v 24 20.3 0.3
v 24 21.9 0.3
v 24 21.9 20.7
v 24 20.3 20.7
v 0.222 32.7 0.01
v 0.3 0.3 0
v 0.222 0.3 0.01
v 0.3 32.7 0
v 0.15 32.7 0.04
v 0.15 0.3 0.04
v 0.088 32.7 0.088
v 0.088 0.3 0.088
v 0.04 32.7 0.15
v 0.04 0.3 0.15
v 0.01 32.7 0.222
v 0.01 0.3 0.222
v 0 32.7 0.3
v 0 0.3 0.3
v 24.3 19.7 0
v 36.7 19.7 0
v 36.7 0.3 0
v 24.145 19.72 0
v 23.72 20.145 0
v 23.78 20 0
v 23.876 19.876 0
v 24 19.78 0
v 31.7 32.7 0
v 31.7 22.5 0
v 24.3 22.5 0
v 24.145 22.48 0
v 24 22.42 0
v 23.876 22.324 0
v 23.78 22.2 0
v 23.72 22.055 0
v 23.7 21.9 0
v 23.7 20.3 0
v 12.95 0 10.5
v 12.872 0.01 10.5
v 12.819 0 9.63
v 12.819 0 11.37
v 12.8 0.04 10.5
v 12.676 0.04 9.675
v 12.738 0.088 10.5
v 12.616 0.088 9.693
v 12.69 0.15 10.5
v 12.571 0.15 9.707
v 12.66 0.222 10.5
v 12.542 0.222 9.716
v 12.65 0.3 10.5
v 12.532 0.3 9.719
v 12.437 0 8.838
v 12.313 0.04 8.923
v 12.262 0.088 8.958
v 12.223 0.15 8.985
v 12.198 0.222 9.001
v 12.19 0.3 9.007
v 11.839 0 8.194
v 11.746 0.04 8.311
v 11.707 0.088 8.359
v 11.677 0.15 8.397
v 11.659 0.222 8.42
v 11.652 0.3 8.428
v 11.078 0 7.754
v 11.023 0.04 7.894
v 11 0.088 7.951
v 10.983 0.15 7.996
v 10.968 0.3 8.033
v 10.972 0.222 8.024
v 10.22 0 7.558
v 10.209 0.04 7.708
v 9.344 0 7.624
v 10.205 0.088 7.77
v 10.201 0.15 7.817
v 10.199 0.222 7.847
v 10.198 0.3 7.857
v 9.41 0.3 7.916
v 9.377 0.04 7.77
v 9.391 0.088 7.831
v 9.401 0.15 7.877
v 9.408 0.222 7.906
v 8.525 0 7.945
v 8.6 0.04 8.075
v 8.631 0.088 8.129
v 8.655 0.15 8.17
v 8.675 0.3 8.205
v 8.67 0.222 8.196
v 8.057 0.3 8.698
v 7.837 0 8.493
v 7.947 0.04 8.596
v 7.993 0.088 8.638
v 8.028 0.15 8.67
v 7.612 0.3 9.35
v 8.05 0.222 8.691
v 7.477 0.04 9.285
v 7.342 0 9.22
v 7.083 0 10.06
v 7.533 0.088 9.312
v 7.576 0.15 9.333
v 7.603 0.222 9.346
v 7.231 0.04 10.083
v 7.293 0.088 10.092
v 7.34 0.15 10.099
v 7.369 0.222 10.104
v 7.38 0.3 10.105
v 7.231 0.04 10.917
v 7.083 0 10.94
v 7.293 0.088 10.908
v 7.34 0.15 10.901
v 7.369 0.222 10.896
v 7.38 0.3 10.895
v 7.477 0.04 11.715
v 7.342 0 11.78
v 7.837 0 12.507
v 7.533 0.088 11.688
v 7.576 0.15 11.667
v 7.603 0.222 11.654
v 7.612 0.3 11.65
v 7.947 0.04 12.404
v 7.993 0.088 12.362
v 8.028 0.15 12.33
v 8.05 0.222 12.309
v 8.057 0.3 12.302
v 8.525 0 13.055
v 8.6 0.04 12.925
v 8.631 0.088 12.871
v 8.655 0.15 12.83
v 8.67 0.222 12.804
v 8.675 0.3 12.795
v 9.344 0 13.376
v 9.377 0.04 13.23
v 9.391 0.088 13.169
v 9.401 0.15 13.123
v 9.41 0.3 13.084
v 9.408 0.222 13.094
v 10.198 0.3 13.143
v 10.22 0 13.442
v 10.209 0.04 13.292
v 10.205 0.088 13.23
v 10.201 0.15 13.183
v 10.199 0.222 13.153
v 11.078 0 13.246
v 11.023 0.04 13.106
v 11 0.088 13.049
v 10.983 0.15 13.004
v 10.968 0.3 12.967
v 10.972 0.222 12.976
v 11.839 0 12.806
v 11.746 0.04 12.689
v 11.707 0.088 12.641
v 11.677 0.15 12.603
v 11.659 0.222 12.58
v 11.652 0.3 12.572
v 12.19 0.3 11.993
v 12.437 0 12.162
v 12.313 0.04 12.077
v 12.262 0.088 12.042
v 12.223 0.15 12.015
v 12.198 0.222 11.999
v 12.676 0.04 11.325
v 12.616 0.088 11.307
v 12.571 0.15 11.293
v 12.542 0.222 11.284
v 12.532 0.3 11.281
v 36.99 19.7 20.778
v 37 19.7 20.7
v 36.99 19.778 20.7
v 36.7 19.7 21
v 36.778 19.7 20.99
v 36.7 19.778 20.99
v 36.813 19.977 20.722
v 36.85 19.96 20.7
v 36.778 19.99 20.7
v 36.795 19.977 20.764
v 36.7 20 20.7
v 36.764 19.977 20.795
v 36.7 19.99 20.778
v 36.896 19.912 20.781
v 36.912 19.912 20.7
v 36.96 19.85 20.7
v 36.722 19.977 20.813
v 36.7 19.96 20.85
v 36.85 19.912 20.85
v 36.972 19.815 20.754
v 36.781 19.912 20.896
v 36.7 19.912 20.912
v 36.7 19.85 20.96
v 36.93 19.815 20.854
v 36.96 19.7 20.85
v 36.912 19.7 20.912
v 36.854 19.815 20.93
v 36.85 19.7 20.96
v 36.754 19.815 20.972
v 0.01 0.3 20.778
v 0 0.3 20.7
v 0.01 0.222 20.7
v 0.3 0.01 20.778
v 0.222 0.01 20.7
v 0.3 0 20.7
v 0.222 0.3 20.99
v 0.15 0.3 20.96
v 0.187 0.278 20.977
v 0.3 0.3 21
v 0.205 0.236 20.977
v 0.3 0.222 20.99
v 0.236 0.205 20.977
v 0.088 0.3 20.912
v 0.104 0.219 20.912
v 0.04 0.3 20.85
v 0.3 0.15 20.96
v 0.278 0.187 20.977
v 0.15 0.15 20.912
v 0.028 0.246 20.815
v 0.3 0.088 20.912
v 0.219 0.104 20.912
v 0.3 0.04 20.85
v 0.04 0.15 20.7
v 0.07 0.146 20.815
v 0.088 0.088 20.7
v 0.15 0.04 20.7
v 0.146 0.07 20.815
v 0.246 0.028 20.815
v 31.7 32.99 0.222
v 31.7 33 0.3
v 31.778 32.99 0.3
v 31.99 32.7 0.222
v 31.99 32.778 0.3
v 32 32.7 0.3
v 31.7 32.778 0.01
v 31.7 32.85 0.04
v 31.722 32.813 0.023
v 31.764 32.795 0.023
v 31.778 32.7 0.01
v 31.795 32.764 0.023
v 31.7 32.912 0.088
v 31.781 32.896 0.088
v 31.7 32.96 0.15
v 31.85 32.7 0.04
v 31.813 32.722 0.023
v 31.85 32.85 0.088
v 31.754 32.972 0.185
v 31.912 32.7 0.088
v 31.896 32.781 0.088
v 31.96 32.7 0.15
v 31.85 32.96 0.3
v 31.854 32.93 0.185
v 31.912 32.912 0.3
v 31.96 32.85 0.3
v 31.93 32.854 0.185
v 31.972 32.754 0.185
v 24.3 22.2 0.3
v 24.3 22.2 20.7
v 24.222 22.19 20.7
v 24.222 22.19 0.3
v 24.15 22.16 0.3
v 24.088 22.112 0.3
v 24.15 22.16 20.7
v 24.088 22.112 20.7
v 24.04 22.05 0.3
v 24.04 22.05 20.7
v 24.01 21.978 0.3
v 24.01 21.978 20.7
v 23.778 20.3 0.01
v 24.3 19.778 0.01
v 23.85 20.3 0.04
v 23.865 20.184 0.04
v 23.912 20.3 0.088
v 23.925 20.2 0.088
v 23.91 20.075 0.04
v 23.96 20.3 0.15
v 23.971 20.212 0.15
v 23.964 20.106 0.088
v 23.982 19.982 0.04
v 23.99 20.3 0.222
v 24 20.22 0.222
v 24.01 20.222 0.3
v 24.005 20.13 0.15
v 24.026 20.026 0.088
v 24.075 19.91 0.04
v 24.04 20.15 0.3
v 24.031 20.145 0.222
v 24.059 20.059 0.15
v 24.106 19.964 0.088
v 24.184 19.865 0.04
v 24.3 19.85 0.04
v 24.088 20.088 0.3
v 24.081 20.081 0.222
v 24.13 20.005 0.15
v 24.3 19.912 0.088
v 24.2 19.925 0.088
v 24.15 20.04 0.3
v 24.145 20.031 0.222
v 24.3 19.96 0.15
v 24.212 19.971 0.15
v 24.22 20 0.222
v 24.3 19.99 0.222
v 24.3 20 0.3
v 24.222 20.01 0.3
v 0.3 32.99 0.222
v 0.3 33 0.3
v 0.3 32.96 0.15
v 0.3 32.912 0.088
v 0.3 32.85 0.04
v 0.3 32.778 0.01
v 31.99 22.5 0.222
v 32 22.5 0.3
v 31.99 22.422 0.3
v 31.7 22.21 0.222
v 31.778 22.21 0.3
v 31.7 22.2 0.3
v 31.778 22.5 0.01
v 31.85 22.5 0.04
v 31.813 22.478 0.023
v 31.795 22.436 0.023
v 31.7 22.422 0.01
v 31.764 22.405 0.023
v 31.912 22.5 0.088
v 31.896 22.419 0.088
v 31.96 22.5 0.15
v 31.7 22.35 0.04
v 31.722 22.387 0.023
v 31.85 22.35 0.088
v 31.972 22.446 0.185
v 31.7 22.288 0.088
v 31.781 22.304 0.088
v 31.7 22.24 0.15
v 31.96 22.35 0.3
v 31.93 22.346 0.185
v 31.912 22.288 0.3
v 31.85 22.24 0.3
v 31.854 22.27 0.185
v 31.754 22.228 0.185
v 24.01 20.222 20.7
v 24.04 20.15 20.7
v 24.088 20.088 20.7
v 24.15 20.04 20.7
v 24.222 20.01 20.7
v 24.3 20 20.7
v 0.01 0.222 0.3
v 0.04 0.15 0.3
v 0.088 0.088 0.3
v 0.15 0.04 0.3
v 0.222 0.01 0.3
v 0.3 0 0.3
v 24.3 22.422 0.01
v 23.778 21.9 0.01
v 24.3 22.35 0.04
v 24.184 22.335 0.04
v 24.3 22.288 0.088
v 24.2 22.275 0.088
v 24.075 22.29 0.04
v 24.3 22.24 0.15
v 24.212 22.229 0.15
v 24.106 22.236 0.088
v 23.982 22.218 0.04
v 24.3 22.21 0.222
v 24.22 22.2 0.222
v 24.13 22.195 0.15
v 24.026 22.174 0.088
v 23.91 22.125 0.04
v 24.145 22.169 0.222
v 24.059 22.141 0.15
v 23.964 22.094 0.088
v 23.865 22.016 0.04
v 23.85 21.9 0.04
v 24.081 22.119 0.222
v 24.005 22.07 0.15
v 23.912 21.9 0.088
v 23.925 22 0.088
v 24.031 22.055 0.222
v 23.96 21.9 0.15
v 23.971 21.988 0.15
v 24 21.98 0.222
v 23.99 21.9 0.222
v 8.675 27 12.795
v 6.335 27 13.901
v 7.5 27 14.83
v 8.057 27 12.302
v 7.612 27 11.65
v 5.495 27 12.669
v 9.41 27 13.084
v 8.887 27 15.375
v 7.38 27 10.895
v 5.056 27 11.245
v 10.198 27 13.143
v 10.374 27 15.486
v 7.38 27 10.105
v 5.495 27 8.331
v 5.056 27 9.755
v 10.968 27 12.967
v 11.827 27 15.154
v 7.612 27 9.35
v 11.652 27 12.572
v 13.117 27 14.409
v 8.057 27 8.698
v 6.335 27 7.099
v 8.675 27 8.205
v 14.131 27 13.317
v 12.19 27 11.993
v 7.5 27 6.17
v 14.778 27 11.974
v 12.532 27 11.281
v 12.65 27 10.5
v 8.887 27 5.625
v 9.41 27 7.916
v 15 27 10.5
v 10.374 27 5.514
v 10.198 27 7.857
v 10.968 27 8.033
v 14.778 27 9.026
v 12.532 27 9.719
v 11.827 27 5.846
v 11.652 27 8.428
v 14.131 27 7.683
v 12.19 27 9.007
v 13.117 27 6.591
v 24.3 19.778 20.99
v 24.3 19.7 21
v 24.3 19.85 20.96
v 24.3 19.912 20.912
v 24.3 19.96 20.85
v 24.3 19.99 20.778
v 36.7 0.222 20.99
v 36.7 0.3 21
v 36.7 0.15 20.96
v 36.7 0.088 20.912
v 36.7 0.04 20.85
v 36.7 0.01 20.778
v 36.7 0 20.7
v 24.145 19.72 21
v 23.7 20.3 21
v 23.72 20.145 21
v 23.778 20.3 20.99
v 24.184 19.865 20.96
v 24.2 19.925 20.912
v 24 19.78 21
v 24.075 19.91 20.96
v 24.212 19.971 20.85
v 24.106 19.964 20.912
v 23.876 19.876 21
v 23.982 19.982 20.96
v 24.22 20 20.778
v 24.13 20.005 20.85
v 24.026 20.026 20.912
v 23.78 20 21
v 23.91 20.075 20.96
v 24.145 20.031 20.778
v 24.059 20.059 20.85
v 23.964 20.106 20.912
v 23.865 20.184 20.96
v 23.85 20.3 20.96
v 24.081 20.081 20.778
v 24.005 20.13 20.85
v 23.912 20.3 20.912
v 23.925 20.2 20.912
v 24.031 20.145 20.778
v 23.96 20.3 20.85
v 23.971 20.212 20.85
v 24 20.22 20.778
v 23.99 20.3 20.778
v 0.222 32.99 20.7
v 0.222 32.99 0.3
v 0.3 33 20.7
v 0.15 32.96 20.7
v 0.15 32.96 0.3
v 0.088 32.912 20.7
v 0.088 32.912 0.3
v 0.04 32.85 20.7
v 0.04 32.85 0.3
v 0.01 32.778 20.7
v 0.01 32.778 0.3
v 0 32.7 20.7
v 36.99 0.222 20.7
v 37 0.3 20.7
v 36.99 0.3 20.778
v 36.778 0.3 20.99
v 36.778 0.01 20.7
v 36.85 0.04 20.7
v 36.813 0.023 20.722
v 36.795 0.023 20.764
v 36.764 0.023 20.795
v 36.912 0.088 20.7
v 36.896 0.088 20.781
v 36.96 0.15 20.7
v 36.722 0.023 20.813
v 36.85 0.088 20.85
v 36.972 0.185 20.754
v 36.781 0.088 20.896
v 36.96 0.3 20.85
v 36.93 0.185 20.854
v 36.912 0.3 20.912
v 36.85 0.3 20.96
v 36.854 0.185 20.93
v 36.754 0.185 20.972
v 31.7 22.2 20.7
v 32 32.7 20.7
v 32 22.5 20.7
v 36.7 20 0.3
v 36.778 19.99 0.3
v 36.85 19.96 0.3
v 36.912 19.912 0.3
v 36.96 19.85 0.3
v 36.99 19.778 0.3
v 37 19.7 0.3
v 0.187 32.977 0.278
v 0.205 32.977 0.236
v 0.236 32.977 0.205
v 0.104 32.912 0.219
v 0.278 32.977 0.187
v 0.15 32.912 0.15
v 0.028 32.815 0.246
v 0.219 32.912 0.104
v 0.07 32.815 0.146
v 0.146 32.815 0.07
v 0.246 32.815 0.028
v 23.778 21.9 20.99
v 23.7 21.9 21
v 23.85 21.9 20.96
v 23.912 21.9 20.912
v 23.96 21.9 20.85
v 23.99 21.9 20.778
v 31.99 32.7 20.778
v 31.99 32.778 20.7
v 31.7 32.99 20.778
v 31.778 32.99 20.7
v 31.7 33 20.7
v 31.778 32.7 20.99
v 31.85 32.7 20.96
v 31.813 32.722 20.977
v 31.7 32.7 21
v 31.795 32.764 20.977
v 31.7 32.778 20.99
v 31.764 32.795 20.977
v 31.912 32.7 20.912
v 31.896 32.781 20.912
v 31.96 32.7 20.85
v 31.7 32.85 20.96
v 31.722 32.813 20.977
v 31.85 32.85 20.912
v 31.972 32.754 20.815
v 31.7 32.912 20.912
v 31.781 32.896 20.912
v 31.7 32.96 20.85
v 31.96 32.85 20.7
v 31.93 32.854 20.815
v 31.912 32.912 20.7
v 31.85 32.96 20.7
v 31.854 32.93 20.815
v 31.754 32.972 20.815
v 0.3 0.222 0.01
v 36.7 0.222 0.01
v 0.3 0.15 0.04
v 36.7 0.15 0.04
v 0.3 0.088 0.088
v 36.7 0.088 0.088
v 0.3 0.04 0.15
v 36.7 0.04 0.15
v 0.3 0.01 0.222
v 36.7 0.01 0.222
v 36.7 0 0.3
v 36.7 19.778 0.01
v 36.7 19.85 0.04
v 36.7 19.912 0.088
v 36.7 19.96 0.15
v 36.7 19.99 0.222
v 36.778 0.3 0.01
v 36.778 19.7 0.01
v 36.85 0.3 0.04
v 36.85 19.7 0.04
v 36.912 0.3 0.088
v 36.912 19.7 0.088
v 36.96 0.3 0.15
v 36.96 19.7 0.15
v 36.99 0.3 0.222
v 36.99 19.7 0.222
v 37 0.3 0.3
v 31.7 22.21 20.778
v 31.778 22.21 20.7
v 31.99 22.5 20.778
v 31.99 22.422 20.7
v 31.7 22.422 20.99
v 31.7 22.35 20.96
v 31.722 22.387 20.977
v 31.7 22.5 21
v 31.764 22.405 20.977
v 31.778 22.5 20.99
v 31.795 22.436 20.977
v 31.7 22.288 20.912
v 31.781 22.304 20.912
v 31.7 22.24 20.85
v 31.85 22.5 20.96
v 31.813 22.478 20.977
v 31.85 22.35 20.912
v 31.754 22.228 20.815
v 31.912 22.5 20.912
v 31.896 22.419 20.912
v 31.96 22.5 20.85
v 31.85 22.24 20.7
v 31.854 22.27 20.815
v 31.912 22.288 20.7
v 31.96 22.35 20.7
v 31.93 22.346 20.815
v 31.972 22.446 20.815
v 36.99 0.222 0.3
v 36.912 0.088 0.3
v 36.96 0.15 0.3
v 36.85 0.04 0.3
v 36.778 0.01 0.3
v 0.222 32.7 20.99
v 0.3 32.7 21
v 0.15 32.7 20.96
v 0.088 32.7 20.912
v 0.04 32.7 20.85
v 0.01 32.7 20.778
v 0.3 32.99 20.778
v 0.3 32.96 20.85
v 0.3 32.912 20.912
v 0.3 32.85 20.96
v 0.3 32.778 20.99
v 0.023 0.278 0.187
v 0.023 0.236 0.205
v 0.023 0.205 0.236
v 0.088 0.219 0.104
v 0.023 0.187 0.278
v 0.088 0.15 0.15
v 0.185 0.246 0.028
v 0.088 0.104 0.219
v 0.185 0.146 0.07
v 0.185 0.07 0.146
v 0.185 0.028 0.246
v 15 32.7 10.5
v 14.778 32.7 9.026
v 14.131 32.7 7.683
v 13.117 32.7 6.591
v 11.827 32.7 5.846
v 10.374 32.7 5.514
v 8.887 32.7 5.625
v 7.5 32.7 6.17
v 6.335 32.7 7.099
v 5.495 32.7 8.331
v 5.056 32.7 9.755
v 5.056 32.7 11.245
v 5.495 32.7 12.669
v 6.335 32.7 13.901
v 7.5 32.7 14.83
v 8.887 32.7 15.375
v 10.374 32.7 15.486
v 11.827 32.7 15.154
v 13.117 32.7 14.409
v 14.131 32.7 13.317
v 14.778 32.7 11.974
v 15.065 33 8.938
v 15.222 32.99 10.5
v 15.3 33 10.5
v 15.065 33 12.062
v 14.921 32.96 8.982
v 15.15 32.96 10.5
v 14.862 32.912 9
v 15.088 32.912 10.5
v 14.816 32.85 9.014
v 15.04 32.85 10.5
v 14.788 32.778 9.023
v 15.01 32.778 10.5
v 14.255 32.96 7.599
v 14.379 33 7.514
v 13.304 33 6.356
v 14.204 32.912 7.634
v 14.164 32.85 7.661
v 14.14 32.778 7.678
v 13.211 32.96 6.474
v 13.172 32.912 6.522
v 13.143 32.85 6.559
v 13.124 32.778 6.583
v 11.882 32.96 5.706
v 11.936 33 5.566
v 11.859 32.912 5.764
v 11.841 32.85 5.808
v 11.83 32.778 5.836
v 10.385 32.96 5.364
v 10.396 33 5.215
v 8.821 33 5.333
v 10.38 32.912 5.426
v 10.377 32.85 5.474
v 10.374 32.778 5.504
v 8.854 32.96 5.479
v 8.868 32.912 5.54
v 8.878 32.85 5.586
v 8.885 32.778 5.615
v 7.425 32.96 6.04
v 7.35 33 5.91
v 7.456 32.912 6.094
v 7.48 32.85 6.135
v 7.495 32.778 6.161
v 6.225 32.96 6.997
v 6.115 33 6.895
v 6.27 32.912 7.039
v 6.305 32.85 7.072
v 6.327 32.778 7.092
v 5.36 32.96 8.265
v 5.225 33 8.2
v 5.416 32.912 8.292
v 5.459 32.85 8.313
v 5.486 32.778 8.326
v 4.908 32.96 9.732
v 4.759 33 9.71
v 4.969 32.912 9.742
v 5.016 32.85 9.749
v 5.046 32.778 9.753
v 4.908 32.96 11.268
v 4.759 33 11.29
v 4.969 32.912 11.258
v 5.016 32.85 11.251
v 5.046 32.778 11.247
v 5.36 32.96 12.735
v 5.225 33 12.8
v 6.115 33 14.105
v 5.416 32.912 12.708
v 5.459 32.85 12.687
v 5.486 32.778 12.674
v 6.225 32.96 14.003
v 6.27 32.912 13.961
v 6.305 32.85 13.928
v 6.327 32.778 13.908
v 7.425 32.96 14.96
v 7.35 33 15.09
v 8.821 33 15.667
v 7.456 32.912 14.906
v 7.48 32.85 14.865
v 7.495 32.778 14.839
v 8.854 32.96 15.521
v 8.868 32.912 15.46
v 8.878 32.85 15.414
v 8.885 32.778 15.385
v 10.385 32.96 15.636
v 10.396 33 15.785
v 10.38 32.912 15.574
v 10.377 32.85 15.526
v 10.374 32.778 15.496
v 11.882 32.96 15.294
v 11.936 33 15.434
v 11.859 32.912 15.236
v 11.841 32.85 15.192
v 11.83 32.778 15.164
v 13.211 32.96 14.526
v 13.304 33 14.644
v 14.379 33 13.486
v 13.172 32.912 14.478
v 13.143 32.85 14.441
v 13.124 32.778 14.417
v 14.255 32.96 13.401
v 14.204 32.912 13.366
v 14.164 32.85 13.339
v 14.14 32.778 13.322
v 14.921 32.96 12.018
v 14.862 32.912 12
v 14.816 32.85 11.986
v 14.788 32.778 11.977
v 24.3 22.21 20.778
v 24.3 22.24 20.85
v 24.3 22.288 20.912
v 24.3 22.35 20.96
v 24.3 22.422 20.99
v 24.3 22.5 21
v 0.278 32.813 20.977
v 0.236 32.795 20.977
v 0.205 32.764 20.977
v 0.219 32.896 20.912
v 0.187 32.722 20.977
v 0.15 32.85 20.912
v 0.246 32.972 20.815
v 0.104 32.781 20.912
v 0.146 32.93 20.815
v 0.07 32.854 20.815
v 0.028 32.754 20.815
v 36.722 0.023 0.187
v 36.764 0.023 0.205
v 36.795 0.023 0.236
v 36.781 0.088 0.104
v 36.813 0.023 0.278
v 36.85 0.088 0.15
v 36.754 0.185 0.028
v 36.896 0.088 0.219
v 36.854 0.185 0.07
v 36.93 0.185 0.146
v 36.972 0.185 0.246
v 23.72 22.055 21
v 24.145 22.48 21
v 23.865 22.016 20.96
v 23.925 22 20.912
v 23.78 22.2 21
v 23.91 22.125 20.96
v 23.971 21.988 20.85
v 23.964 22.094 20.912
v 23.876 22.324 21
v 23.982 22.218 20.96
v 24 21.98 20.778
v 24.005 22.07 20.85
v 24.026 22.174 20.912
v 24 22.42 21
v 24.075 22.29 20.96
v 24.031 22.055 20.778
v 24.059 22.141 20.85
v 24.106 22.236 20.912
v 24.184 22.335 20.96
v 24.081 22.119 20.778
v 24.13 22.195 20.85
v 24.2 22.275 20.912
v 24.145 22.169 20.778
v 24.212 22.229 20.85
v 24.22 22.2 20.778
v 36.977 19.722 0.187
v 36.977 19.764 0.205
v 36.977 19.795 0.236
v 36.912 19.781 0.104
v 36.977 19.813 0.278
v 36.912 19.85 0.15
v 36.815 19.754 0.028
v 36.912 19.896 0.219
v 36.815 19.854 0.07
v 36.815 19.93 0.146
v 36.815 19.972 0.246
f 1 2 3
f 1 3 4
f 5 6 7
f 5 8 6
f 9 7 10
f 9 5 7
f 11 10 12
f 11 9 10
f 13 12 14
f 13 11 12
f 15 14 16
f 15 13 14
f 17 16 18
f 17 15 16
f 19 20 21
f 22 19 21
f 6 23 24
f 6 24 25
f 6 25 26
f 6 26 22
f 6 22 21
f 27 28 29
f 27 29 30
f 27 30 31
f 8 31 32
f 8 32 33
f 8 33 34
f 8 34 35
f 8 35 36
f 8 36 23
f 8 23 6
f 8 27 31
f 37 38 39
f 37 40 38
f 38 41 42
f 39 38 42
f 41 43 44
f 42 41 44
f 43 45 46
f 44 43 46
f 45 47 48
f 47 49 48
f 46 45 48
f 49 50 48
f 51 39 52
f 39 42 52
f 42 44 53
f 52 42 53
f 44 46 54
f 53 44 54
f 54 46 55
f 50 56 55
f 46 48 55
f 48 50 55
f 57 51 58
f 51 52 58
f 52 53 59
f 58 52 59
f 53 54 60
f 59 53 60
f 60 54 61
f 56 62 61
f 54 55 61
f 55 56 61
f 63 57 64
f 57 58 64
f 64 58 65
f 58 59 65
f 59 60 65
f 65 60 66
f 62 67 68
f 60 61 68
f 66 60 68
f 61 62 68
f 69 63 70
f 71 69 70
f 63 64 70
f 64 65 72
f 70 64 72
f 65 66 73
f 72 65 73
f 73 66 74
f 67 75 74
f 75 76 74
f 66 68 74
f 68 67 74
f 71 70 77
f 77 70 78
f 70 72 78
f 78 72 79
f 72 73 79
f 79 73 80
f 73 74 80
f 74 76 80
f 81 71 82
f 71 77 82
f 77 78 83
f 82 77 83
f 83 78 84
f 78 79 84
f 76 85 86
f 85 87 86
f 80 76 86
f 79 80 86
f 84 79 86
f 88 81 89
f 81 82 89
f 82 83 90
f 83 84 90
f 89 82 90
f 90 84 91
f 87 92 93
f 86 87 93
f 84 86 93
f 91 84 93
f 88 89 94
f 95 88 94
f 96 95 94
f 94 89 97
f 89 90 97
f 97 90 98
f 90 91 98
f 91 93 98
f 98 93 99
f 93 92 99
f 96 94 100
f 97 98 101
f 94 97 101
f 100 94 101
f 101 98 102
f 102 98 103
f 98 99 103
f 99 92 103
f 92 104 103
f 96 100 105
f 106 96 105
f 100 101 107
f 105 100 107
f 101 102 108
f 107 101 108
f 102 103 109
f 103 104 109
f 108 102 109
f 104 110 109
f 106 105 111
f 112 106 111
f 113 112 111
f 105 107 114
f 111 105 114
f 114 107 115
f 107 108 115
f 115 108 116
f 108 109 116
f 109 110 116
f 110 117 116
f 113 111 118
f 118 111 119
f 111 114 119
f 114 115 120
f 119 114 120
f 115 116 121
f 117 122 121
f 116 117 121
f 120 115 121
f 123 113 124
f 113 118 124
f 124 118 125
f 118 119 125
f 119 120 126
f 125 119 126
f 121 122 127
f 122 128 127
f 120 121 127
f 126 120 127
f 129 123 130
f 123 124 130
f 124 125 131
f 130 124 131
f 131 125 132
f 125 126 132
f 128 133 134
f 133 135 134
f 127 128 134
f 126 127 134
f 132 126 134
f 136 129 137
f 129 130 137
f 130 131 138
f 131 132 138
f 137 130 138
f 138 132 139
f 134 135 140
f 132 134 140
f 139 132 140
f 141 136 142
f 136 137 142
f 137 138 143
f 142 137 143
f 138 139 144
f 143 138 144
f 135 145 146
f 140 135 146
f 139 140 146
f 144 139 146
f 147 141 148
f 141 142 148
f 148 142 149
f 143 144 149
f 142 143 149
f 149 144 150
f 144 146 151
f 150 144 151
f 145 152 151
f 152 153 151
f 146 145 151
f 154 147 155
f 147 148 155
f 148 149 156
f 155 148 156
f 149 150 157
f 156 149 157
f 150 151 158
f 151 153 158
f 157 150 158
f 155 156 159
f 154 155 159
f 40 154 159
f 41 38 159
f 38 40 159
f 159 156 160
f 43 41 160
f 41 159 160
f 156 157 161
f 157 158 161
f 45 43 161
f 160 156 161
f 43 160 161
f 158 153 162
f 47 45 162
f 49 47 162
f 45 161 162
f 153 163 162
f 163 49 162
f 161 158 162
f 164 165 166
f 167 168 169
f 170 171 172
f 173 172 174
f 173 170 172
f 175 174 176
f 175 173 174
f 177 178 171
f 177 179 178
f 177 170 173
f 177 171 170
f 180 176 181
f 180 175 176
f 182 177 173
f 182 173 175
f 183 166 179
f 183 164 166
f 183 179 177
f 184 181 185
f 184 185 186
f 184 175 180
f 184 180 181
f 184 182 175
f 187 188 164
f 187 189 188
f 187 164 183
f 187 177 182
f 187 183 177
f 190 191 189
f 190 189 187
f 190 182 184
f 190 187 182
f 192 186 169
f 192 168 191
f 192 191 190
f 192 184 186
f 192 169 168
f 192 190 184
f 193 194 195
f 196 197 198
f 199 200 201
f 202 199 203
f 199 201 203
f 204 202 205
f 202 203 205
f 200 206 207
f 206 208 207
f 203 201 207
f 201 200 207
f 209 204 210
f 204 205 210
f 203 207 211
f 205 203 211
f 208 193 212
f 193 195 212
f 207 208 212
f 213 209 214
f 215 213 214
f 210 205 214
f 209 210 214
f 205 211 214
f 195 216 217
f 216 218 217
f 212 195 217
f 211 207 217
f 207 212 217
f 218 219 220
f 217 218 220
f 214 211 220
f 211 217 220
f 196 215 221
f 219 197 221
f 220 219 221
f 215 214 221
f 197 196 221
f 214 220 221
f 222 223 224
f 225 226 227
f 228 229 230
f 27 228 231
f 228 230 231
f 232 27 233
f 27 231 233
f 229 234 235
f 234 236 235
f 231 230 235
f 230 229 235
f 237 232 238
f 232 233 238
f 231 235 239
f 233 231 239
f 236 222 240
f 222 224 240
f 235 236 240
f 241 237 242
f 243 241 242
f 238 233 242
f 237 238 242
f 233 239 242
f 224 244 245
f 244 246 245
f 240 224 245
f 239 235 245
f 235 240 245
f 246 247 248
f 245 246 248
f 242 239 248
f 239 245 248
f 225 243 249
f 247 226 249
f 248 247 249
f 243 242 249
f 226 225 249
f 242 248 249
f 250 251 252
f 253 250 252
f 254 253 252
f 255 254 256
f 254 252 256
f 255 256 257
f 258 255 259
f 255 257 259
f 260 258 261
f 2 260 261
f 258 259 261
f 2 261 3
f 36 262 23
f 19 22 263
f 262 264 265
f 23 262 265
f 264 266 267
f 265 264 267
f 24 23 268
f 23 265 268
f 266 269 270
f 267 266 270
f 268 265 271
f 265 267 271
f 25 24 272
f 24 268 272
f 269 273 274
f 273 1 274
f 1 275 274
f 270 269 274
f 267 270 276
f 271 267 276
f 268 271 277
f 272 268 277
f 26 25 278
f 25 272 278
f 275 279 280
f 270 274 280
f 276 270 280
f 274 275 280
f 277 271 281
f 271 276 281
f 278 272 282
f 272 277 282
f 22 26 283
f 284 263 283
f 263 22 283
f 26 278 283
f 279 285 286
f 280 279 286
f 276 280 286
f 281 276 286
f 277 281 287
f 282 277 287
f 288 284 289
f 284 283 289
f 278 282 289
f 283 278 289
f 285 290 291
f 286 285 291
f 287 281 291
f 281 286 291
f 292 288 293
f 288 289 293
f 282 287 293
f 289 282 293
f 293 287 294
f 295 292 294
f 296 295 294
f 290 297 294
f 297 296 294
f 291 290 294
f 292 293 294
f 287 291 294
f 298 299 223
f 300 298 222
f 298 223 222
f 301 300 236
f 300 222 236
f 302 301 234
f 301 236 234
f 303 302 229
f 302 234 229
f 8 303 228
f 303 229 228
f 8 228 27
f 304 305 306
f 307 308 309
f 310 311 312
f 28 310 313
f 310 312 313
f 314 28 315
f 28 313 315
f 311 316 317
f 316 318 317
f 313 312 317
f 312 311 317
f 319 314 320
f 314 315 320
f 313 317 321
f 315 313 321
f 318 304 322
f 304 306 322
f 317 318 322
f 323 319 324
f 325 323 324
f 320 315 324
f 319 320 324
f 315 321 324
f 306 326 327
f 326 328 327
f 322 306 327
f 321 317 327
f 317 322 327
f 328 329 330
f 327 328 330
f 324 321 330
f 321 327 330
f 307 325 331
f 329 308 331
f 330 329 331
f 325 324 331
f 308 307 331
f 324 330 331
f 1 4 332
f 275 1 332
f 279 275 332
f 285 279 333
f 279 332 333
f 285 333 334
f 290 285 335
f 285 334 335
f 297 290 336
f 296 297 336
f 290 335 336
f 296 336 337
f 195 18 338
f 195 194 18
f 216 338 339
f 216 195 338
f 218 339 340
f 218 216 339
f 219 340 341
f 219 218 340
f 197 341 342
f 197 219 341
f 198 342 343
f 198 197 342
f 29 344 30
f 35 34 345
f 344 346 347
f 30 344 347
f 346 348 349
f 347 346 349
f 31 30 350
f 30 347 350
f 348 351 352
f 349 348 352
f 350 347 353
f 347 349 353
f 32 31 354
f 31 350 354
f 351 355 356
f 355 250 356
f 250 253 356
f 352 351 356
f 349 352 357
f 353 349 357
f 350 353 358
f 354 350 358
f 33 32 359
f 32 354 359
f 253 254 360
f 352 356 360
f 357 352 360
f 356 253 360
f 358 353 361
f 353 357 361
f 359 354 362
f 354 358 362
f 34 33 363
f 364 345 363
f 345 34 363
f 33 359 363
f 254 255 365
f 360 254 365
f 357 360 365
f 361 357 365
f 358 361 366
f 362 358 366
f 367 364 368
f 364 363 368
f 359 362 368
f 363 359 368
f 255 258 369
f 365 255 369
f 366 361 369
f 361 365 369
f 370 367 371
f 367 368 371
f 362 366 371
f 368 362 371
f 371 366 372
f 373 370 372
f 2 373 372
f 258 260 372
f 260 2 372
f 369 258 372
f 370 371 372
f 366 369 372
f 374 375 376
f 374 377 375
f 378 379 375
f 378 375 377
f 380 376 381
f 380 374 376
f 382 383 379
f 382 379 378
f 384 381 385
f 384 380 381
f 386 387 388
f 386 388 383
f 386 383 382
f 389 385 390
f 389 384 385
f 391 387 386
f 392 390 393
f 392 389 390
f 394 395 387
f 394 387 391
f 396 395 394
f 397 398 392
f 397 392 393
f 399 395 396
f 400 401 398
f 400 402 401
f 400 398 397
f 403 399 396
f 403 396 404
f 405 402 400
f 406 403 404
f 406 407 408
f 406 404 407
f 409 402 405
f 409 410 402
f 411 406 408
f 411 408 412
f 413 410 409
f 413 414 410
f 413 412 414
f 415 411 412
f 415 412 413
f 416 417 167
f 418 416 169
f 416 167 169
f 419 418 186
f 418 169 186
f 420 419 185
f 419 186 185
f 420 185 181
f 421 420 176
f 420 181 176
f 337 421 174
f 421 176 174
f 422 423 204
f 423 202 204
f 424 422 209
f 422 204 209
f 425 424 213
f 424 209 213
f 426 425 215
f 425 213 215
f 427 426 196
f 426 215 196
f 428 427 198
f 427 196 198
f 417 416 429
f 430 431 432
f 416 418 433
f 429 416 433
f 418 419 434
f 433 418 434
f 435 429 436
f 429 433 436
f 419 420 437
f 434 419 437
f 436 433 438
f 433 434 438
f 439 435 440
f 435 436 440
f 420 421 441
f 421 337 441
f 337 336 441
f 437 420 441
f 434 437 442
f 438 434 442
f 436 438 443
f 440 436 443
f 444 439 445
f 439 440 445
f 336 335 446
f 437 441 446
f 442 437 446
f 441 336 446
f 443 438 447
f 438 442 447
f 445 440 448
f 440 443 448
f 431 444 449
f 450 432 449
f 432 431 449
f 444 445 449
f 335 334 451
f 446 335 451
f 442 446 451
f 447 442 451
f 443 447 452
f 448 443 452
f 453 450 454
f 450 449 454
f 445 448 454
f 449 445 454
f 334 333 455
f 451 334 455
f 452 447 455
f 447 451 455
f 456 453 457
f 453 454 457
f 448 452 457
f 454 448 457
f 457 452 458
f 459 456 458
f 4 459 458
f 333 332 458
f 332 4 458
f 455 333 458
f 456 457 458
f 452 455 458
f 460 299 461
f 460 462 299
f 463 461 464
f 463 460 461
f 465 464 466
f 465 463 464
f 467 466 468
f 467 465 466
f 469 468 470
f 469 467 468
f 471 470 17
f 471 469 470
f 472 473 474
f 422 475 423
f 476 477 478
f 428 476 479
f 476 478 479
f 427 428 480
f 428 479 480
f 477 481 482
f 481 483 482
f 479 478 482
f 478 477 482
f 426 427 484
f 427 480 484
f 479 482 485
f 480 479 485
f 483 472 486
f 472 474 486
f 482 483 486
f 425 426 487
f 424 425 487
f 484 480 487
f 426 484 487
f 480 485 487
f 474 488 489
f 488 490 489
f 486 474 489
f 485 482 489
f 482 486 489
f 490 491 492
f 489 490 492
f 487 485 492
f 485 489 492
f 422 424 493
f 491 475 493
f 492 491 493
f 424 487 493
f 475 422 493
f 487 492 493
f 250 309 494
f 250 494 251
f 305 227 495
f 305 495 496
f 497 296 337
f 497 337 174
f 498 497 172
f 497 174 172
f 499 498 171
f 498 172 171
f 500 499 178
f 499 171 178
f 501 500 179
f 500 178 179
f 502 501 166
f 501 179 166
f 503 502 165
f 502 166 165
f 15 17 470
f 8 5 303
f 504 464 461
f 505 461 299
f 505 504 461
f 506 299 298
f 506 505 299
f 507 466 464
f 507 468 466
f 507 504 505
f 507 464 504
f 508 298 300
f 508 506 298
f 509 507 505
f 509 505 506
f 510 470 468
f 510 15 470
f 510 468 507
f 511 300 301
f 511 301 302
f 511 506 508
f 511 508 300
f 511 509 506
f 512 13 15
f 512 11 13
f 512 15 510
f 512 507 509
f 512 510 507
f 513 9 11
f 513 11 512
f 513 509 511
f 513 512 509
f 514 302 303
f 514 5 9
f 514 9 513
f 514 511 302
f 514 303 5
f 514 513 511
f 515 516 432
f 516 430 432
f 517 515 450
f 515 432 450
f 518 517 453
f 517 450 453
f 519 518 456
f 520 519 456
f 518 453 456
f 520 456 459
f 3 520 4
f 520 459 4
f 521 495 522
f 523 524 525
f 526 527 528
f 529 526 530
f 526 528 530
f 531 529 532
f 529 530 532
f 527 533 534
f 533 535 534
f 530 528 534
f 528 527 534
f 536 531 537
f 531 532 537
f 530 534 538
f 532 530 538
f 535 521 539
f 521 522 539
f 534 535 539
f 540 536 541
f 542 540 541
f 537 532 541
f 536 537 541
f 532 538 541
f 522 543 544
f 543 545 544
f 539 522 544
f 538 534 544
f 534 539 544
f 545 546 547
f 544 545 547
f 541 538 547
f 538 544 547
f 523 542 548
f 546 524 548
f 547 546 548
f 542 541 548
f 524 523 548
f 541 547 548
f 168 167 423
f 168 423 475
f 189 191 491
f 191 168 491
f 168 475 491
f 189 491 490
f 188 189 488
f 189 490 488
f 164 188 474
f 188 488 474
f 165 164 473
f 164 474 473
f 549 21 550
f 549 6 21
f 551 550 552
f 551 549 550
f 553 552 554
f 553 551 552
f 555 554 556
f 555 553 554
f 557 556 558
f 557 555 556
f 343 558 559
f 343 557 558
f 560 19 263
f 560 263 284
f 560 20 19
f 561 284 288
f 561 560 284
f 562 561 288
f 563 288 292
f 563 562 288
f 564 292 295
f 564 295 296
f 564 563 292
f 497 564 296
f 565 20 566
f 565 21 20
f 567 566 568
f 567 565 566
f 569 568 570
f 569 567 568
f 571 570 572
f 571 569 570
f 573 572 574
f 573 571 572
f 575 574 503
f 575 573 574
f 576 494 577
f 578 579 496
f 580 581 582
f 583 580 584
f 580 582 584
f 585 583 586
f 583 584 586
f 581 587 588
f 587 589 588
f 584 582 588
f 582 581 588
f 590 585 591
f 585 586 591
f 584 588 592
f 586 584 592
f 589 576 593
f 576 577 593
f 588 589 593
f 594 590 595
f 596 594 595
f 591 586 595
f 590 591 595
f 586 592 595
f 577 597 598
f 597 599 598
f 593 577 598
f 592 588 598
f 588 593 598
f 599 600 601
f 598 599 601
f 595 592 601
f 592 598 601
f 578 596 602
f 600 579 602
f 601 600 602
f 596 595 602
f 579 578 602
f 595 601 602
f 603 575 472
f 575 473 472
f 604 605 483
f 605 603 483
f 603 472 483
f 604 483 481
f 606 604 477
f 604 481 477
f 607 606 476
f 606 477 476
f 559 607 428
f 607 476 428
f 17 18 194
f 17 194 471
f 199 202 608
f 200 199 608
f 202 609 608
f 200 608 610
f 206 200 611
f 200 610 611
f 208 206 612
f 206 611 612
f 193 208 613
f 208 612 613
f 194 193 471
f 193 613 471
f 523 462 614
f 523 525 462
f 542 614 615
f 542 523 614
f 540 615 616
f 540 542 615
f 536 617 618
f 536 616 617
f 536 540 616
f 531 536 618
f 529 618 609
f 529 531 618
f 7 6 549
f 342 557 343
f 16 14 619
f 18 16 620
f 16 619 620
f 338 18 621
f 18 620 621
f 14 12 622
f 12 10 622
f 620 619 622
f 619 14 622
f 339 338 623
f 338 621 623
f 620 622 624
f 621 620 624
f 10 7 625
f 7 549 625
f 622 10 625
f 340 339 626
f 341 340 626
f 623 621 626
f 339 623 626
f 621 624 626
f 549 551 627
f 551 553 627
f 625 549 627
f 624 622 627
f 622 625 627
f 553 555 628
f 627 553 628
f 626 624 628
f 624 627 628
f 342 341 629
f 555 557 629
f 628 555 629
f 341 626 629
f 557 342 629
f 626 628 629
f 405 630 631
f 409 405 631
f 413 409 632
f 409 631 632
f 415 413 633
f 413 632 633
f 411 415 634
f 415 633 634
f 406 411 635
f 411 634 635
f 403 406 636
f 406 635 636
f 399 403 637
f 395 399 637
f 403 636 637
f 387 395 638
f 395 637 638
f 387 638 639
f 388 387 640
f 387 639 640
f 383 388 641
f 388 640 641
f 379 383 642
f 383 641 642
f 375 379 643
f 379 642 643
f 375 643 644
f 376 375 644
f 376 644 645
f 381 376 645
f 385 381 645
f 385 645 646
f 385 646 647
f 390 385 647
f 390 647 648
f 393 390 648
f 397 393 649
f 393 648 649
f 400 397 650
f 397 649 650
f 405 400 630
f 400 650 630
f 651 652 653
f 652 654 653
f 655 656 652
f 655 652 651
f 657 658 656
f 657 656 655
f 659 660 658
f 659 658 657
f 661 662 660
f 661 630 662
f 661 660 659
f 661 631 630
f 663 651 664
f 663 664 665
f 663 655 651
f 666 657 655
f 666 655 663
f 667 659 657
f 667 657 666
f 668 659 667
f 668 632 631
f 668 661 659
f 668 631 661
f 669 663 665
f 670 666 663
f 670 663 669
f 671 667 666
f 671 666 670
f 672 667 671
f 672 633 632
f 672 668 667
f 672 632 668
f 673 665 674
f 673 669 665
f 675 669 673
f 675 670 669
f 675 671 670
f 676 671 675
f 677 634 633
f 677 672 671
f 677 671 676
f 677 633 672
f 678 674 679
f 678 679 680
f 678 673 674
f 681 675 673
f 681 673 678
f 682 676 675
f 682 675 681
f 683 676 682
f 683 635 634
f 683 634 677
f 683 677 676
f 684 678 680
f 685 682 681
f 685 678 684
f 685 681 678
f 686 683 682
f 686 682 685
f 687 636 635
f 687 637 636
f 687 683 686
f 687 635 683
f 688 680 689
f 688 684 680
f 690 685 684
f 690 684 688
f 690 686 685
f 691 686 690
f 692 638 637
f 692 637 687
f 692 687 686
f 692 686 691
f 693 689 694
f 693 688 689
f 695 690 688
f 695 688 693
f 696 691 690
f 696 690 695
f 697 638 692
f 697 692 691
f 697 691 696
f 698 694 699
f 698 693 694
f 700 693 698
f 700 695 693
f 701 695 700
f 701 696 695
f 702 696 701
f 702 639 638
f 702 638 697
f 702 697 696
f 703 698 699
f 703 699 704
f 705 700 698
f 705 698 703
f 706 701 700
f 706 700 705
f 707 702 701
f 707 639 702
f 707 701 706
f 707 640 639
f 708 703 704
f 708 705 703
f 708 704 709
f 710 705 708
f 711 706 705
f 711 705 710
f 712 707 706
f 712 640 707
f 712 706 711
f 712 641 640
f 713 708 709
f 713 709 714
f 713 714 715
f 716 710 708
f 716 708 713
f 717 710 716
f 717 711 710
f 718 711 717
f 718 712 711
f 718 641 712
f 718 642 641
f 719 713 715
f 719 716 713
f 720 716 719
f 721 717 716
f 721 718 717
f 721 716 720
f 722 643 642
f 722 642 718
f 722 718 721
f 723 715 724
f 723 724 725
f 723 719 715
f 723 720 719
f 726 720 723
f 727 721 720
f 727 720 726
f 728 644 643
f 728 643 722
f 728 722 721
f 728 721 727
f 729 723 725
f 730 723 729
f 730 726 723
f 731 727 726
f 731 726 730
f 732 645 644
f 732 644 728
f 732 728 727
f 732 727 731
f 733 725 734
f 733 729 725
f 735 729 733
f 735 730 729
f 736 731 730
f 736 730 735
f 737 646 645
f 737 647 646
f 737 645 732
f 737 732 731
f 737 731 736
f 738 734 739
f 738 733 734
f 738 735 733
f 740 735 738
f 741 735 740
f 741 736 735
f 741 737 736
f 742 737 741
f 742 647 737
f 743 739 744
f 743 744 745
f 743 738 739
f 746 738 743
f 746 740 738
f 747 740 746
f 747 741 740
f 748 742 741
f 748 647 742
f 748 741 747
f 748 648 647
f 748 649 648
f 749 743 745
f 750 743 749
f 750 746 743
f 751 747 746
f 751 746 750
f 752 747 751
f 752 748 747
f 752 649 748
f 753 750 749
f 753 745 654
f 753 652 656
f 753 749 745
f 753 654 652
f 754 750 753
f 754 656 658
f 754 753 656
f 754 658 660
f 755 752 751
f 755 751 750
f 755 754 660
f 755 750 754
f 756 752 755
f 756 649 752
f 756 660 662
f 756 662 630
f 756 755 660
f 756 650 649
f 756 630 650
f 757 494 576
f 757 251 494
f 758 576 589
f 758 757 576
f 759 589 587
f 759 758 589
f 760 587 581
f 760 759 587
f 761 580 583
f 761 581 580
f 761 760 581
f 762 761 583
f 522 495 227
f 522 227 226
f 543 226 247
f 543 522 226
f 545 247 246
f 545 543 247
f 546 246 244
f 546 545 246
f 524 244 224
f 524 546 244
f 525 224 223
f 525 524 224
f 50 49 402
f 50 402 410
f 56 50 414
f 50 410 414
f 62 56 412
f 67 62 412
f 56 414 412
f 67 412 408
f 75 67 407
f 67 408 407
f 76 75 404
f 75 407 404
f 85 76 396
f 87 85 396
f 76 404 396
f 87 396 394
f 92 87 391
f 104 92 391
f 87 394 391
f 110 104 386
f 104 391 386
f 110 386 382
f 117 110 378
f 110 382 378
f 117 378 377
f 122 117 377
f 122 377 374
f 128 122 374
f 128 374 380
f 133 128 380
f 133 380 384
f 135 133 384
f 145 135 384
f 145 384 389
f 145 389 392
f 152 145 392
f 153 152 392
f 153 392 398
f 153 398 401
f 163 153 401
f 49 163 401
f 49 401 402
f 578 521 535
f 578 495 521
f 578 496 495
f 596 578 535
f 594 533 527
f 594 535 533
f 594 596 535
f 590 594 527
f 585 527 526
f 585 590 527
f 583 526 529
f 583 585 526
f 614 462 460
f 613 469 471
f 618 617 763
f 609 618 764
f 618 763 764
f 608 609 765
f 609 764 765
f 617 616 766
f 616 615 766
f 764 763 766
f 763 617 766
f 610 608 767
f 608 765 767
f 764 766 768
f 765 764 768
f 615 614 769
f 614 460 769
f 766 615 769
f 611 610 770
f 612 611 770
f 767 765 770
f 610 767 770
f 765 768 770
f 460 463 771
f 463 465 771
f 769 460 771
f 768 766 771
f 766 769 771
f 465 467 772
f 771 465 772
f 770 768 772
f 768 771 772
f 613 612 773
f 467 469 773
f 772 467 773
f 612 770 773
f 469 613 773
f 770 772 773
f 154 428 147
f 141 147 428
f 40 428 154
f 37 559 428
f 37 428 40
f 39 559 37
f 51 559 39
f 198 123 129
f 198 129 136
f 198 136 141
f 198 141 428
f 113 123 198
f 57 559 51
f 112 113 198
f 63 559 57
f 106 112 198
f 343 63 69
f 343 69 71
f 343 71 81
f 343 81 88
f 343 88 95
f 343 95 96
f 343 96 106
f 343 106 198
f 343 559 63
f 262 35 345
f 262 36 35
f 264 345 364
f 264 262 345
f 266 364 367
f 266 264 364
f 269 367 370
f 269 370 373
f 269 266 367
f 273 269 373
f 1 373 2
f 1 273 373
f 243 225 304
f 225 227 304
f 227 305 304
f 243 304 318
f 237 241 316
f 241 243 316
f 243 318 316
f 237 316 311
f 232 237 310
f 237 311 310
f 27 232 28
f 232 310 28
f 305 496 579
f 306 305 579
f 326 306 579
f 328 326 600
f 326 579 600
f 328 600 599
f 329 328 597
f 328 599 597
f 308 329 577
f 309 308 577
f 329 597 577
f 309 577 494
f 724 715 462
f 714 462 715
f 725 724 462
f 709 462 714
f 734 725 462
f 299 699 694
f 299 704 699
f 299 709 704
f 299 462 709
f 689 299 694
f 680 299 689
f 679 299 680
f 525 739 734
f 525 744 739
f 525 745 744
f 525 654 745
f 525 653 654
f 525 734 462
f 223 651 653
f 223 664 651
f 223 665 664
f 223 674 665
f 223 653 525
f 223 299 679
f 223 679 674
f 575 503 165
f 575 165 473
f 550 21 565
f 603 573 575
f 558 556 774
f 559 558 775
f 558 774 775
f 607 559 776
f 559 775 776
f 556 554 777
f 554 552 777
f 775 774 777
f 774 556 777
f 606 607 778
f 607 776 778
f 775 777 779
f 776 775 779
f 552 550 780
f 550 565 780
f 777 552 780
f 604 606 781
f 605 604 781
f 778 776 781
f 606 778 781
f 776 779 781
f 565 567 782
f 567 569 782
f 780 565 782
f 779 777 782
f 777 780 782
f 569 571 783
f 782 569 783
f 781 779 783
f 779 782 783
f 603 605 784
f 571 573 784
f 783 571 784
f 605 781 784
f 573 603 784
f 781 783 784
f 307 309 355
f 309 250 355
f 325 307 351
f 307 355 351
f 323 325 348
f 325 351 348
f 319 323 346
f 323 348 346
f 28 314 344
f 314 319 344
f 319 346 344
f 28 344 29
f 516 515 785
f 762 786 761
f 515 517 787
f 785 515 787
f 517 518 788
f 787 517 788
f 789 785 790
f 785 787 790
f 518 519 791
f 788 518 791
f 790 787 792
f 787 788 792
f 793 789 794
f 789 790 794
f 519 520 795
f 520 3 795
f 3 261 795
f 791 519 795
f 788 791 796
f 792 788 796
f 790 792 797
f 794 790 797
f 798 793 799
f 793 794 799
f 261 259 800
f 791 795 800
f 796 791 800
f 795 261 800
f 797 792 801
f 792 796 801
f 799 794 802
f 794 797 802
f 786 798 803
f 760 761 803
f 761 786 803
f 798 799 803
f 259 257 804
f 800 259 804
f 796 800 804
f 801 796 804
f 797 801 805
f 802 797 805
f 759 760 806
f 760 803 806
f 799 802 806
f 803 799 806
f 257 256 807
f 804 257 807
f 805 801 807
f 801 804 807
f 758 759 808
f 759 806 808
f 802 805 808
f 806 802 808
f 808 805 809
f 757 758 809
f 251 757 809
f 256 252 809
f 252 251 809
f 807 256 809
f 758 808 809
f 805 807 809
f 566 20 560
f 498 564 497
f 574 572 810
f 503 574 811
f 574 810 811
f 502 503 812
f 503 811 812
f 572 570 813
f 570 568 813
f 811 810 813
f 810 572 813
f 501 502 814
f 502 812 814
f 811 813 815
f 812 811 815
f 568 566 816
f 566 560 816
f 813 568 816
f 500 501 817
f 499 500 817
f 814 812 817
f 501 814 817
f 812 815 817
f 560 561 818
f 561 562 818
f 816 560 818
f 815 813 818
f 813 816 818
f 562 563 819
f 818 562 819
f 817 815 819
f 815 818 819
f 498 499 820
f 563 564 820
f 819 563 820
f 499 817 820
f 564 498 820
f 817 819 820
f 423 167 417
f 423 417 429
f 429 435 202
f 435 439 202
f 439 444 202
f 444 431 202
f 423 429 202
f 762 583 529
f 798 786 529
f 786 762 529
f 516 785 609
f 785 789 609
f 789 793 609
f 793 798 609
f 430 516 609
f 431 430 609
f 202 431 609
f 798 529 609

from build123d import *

# Parameters (mm, degrees)
BOSS_EXTRUDE1_DEPTH = 21
SKETCH2_R           = 2.65
CUT_EXTRUDE1_DEPTH  = 34
SKETCH3_R           = 5
CUT_EXTRUDE2_DEPTH  = 6
FILLET1_R           = 0.3


with BuildPart() as part:
    # Sketch1 → Boss-Extrude1 (new body)
    with BuildSketch(Plane.XY):
        Polygon((32, 33), (32, 22.2), (24, 22.2), (24, 20), (37, 20), (37, 0), (0, 0), (0, 33), align=None)
    extrude(amount=BOSS_EXTRUDE1_DEPTH)

    # Sketch2 → Cut-Extrude1 (cut, through all)
    with BuildSketch(Plane(origin=(0, 33, 0), x_dir=(1, 0, 0), z_dir=(0, 1, 0))):
        with Locations((10, -10.5)):
            Circle(SKETCH2_R)
    extrude(amount=-CUT_EXTRUDE1_DEPTH, mode=Mode.SUBTRACT)

    # Sketch3 → Cut-Extrude2 (cut)
    with BuildSketch(Plane(origin=(0, 33, 0), x_dir=(1, 0, 0), z_dir=(0, 1, 0))):
        with Locations((10, -10.5)):
            Circle(SKETCH3_R)
    extrude(amount=-CUT_EXTRUDE2_DEPTH, mode=Mode.SUBTRACT)

    # Fillet1
    fillet1_edges = [part.edges().sort_by_distance(p)[0] for p in [
        (30.5, 20, 0),
        (37, 10, 0),
        (18.5, 0, 0),
        (0, 16.5, 0),
        (37, 10, 21),
        (0, 33, 10.5),
        (32, 33, 10.5),
        (32, 22.2, 10.5),
        (24, 22.2, 10.5),
        (24, 20, 10.5),
        (37, 20, 10.5),
        (37, 0, 10.5),
        (0, 0, 10.5),
        (30.5, 20, 21),
        (24, 21.1, 21),
        (28, 22.2, 21),
        (7.35, 0, 10.5),
        (32, 27.6, 21),
        (5, 33, 10.5),
        (16, 33, 21),
        (0, 16.5, 21),
        (16, 33, 0),
        (18.5, 0, 21),
        (32, 27.6, 0),
        (28, 22.2, 0),
        (24, 21.1, 0),
    ]]
    fillet(fillet1_edges, radius=FILLET1_R)


solid = part.part
